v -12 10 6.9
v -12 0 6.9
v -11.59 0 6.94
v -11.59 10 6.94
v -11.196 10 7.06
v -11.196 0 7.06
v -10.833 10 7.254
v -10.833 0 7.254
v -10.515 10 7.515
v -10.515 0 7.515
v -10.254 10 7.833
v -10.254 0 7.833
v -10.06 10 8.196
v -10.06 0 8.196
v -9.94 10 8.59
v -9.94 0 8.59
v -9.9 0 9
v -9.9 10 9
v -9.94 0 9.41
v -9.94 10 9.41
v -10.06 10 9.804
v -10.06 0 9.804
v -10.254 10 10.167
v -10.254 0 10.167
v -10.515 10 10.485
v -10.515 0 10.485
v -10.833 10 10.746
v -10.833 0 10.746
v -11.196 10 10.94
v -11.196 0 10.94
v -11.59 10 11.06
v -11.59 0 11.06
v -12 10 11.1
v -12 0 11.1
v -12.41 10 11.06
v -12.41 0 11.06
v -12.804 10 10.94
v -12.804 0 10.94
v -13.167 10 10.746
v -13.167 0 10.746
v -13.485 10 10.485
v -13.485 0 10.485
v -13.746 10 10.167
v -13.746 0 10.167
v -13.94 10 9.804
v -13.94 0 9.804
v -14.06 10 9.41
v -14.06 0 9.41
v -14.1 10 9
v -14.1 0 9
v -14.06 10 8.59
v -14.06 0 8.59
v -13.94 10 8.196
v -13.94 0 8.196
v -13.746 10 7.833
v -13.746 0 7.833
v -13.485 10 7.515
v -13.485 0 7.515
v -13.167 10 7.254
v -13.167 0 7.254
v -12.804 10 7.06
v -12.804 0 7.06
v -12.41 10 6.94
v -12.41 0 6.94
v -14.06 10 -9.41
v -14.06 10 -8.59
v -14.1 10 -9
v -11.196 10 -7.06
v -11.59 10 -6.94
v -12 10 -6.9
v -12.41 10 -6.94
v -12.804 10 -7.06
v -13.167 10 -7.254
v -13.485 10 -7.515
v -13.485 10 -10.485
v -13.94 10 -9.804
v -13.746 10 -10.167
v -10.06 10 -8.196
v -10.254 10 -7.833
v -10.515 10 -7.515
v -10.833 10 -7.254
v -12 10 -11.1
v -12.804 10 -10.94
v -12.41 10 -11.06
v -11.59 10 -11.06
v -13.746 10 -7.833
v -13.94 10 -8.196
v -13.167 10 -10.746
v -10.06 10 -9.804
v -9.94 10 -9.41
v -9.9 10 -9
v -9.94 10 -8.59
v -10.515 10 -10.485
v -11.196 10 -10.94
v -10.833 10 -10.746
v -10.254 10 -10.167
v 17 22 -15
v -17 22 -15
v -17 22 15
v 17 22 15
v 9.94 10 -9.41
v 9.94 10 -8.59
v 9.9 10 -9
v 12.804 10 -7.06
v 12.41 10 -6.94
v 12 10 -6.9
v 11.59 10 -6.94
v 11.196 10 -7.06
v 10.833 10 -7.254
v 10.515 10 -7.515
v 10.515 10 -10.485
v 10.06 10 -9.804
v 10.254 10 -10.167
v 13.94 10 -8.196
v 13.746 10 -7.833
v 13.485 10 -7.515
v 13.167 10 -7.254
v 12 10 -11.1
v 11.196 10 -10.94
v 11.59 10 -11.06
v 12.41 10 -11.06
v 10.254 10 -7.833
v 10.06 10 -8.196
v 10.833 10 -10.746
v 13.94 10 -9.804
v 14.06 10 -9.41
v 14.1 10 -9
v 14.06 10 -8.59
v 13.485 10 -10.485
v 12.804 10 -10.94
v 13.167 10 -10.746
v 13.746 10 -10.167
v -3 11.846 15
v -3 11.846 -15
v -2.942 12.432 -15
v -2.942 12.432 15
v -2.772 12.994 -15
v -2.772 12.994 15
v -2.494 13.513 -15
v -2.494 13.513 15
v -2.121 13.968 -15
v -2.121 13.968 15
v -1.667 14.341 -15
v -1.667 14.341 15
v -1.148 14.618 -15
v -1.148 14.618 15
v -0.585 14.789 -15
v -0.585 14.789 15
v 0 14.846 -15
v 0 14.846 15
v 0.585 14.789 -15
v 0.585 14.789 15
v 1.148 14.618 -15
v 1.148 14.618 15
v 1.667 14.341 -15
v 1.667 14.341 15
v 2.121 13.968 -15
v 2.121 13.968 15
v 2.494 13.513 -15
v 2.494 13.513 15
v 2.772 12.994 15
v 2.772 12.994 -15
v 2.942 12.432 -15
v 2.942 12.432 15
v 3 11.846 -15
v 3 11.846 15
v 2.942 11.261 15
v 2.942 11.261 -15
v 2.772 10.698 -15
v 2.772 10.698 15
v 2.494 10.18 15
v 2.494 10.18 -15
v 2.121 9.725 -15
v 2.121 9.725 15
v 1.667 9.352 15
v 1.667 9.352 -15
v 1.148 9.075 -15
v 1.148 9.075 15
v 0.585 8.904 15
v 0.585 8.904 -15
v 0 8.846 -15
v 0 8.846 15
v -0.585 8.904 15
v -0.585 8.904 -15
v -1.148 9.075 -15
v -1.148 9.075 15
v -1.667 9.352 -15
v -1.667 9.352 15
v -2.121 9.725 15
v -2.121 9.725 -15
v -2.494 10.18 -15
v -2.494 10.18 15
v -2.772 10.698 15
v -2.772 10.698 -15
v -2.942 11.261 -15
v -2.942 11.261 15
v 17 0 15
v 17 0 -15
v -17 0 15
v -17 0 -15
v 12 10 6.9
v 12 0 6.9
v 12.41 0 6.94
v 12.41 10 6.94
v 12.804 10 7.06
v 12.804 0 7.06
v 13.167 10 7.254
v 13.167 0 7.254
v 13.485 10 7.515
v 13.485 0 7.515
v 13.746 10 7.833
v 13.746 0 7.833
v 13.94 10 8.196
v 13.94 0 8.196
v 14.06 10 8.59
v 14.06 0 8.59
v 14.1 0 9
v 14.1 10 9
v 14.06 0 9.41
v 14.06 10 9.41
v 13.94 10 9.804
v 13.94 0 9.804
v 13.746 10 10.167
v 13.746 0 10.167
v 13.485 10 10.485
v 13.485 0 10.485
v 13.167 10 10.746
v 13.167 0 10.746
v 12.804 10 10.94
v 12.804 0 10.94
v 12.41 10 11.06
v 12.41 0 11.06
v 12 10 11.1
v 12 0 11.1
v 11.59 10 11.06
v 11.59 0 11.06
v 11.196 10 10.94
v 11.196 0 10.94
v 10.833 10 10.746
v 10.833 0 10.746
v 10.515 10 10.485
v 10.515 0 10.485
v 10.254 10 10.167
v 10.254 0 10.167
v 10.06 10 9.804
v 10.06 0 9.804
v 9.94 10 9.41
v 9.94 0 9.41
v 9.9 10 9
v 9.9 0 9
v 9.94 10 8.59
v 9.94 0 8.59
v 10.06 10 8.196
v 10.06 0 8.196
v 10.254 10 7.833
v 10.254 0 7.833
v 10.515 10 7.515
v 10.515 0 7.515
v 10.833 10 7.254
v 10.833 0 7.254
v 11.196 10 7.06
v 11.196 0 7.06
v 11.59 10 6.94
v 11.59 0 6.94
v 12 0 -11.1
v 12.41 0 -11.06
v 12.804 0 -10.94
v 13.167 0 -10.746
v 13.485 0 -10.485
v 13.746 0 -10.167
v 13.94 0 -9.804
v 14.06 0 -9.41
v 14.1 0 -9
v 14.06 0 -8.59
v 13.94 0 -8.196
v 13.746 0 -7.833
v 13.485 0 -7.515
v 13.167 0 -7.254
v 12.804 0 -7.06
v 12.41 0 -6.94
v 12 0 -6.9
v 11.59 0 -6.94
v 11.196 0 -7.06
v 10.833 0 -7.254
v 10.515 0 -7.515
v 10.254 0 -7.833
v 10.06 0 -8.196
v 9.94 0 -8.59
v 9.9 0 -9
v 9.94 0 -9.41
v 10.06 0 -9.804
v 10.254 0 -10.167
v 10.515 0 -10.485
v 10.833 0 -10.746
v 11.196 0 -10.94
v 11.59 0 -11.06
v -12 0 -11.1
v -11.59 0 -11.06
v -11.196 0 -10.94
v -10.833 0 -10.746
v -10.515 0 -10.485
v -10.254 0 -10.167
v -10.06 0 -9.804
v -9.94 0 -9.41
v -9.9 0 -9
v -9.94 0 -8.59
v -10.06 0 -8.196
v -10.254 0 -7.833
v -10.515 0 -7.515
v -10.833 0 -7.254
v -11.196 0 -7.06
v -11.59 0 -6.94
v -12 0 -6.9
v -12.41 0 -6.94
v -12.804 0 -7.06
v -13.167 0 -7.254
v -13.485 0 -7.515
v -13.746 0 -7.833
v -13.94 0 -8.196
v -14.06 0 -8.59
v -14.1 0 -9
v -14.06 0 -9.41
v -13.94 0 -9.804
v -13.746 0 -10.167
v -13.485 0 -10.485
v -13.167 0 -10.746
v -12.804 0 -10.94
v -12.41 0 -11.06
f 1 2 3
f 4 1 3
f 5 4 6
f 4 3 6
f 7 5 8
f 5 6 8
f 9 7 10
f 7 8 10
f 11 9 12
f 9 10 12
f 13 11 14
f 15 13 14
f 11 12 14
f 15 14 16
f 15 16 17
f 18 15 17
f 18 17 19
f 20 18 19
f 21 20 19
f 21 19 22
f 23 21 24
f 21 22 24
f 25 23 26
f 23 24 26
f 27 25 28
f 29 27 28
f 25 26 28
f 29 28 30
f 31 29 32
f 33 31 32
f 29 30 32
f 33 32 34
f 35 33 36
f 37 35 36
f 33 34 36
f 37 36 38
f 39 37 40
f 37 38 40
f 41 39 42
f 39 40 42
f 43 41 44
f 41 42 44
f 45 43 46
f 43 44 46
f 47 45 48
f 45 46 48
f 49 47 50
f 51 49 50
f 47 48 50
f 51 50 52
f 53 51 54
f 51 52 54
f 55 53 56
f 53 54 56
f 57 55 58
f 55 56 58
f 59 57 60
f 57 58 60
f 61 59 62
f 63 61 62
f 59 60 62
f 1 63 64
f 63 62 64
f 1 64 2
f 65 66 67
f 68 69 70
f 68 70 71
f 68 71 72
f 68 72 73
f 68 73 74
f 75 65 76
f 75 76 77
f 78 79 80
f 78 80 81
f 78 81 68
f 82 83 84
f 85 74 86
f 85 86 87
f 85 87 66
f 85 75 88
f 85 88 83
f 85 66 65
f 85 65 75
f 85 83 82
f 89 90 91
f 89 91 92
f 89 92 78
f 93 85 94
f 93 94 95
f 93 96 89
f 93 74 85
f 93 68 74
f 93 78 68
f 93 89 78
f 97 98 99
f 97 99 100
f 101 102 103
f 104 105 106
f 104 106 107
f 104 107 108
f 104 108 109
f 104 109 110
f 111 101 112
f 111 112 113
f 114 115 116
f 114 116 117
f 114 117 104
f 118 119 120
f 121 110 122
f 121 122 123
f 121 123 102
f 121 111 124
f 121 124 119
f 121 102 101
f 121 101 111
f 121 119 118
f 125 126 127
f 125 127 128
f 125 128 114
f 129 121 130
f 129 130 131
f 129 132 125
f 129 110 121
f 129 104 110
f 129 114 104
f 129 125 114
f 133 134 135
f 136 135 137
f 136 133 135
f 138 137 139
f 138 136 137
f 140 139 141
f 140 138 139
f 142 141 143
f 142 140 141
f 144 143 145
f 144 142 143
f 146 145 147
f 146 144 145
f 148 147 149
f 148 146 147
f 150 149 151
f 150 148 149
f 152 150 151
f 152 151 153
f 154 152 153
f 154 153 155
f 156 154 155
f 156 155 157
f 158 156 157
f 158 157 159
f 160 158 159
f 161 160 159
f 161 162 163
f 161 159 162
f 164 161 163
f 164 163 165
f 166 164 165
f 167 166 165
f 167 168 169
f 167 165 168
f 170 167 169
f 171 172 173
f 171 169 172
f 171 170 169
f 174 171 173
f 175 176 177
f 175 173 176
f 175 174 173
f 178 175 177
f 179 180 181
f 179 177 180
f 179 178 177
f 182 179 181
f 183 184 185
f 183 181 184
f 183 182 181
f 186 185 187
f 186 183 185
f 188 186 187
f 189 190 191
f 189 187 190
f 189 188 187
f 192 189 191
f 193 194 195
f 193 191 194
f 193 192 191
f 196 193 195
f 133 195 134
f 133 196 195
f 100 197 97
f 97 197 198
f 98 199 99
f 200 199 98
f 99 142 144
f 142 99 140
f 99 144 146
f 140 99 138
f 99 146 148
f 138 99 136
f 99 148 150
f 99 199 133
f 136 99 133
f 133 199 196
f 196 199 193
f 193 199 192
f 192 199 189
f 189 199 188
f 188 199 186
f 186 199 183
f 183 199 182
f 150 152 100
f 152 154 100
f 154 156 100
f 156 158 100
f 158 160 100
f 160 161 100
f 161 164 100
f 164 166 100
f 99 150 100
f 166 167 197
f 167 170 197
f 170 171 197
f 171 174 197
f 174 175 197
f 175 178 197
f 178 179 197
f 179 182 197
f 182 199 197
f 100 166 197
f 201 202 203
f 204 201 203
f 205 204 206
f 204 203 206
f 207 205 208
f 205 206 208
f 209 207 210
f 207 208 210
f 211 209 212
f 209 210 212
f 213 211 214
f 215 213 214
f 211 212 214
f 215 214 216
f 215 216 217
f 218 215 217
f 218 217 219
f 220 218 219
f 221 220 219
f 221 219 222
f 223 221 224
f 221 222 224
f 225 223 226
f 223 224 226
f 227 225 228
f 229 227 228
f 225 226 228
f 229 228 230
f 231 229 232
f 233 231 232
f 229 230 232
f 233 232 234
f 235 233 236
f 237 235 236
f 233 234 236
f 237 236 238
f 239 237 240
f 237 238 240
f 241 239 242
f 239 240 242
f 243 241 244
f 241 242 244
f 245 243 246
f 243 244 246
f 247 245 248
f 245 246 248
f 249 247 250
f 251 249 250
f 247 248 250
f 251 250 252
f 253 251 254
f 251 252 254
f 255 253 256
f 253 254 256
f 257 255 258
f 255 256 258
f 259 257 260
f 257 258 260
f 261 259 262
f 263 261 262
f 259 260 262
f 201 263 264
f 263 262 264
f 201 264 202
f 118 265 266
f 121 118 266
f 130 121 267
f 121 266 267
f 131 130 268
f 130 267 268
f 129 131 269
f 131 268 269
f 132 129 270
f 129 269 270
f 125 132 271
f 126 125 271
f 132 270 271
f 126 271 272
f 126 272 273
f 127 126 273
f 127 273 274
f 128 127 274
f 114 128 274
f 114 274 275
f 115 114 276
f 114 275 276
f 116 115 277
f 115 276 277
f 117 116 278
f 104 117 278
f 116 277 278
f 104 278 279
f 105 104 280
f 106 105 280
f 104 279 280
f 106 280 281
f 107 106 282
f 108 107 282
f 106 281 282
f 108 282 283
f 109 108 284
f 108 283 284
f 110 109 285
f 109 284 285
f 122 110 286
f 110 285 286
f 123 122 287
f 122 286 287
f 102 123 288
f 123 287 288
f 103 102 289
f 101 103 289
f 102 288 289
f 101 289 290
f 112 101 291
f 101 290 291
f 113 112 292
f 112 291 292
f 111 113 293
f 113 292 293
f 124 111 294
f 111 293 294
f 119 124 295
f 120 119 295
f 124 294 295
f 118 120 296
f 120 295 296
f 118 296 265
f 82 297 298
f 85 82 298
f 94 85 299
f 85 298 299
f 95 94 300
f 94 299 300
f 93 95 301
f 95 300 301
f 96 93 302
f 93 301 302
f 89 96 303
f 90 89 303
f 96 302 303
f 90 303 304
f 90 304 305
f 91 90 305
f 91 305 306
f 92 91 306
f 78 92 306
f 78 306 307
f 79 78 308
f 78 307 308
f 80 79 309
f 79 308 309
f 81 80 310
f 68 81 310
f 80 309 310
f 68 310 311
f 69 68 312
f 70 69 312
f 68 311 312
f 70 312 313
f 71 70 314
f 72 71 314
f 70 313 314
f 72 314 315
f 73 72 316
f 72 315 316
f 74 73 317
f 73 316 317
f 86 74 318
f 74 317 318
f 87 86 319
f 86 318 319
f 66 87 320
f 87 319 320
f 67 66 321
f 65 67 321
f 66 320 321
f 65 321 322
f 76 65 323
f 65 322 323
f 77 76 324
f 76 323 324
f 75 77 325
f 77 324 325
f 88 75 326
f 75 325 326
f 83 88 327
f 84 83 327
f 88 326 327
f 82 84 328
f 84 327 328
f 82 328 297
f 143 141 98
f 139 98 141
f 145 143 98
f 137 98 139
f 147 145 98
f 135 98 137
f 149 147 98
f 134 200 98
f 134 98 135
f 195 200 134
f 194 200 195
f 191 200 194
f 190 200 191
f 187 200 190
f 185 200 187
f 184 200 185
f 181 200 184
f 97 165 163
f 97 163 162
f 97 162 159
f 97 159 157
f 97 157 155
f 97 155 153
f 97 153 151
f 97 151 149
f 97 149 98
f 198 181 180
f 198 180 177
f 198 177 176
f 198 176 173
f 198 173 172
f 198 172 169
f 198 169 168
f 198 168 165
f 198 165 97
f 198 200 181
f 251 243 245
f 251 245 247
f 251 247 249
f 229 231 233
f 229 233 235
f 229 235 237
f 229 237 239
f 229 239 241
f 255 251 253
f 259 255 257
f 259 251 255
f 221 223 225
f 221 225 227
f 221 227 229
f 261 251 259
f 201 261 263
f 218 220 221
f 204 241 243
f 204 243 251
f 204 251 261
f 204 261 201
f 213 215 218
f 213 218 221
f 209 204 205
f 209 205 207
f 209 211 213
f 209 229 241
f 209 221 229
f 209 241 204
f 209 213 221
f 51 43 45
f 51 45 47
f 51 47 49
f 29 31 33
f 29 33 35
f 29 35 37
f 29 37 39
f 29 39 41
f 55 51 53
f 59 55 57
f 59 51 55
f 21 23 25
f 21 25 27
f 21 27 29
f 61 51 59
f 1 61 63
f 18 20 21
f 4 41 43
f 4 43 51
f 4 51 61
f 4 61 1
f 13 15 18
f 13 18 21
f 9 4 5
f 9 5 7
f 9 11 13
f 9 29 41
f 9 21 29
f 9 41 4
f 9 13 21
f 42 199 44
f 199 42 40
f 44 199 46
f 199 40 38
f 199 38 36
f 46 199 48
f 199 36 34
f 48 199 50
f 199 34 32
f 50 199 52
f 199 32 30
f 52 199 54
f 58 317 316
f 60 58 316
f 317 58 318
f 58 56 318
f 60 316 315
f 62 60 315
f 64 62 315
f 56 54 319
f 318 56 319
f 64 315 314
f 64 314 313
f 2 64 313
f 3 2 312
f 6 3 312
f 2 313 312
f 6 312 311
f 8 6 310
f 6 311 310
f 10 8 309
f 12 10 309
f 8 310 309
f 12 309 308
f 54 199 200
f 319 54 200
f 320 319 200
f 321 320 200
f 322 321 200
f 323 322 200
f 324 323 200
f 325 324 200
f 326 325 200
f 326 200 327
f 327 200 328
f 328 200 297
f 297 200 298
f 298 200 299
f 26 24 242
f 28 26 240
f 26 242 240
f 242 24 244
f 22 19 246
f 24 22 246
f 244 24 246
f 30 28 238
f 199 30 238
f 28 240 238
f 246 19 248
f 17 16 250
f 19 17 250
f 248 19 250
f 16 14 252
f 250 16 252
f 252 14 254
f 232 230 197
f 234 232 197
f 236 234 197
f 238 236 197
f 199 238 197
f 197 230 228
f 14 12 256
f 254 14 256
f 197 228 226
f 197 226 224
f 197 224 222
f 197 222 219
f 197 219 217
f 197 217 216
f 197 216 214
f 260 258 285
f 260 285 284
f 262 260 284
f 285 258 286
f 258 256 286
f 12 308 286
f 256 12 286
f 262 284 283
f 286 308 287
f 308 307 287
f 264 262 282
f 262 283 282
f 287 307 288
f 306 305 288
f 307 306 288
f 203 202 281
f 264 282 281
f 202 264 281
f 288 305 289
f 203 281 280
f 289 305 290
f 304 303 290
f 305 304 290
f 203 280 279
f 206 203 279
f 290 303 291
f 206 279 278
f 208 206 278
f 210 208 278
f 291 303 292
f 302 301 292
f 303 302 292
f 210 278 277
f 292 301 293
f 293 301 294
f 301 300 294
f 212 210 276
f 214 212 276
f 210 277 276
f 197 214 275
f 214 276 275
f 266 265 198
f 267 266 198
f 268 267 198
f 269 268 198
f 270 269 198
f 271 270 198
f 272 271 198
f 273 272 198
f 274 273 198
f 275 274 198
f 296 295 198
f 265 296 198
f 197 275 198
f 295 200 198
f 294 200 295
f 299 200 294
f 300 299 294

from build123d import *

# Parameters (mm, degrees)
SKETCH_1_W          = 34
SKETCH_1_H          = 30
EXTRUDE_1_DEPTH     = 22
SKETCH_2_R          = 3
CUT_EXTRUDE_1_DEPTH = 42.773197148
SKETCH_3_R          = 2.1
CUT_EXTRUDE_2_DEPTH = 10


with BuildPart() as part:
    # 草图1 → 凸台-拉伸1 (new body)
    with BuildSketch(Plane(origin=(0, 0, 0), x_dir=(1, 0, 0), z_dir=(0, 1, 0))):
        Rectangle(SKETCH_1_W, SKETCH_1_H)
    extrude(amount=EXTRUDE_1_DEPTH)

    # 草图2 → 切除-拉伸1 (cut, through all)
    with BuildSketch(Plane(origin=(2, 0, 15), x_dir=(-1, 0, 0), z_dir=(0, 0, -1))):
        with Locations((2, 11.846291658)):
            Circle(SKETCH_2_R)
    extrude(amount=CUT_EXTRUDE_1_DEPTH, mode=Mode.SUBTRACT)

    # 草图3 → 切除-拉伸2 (cut)
    with BuildSketch(Plane.XZ):
        with Locations(Location((12, 9, 0), (0, 0, 270))):
            Circle(SKETCH_3_R)
        with Locations(Location((12, -9, 0), (0, 0, 270))):
            Circle(SKETCH_3_R)
        with Locations(Location((-12, 9, 0), (0, 0, 270))):
            Circle(SKETCH_3_R)
        with Locations(Location((-12, -9, 0), (0, 0, 270))):
            Circle(SKETCH_3_R)
    extrude(amount=-CUT_EXTRUDE_2_DEPTH, mode=Mode.SUBTRACT)


solid = part.part
